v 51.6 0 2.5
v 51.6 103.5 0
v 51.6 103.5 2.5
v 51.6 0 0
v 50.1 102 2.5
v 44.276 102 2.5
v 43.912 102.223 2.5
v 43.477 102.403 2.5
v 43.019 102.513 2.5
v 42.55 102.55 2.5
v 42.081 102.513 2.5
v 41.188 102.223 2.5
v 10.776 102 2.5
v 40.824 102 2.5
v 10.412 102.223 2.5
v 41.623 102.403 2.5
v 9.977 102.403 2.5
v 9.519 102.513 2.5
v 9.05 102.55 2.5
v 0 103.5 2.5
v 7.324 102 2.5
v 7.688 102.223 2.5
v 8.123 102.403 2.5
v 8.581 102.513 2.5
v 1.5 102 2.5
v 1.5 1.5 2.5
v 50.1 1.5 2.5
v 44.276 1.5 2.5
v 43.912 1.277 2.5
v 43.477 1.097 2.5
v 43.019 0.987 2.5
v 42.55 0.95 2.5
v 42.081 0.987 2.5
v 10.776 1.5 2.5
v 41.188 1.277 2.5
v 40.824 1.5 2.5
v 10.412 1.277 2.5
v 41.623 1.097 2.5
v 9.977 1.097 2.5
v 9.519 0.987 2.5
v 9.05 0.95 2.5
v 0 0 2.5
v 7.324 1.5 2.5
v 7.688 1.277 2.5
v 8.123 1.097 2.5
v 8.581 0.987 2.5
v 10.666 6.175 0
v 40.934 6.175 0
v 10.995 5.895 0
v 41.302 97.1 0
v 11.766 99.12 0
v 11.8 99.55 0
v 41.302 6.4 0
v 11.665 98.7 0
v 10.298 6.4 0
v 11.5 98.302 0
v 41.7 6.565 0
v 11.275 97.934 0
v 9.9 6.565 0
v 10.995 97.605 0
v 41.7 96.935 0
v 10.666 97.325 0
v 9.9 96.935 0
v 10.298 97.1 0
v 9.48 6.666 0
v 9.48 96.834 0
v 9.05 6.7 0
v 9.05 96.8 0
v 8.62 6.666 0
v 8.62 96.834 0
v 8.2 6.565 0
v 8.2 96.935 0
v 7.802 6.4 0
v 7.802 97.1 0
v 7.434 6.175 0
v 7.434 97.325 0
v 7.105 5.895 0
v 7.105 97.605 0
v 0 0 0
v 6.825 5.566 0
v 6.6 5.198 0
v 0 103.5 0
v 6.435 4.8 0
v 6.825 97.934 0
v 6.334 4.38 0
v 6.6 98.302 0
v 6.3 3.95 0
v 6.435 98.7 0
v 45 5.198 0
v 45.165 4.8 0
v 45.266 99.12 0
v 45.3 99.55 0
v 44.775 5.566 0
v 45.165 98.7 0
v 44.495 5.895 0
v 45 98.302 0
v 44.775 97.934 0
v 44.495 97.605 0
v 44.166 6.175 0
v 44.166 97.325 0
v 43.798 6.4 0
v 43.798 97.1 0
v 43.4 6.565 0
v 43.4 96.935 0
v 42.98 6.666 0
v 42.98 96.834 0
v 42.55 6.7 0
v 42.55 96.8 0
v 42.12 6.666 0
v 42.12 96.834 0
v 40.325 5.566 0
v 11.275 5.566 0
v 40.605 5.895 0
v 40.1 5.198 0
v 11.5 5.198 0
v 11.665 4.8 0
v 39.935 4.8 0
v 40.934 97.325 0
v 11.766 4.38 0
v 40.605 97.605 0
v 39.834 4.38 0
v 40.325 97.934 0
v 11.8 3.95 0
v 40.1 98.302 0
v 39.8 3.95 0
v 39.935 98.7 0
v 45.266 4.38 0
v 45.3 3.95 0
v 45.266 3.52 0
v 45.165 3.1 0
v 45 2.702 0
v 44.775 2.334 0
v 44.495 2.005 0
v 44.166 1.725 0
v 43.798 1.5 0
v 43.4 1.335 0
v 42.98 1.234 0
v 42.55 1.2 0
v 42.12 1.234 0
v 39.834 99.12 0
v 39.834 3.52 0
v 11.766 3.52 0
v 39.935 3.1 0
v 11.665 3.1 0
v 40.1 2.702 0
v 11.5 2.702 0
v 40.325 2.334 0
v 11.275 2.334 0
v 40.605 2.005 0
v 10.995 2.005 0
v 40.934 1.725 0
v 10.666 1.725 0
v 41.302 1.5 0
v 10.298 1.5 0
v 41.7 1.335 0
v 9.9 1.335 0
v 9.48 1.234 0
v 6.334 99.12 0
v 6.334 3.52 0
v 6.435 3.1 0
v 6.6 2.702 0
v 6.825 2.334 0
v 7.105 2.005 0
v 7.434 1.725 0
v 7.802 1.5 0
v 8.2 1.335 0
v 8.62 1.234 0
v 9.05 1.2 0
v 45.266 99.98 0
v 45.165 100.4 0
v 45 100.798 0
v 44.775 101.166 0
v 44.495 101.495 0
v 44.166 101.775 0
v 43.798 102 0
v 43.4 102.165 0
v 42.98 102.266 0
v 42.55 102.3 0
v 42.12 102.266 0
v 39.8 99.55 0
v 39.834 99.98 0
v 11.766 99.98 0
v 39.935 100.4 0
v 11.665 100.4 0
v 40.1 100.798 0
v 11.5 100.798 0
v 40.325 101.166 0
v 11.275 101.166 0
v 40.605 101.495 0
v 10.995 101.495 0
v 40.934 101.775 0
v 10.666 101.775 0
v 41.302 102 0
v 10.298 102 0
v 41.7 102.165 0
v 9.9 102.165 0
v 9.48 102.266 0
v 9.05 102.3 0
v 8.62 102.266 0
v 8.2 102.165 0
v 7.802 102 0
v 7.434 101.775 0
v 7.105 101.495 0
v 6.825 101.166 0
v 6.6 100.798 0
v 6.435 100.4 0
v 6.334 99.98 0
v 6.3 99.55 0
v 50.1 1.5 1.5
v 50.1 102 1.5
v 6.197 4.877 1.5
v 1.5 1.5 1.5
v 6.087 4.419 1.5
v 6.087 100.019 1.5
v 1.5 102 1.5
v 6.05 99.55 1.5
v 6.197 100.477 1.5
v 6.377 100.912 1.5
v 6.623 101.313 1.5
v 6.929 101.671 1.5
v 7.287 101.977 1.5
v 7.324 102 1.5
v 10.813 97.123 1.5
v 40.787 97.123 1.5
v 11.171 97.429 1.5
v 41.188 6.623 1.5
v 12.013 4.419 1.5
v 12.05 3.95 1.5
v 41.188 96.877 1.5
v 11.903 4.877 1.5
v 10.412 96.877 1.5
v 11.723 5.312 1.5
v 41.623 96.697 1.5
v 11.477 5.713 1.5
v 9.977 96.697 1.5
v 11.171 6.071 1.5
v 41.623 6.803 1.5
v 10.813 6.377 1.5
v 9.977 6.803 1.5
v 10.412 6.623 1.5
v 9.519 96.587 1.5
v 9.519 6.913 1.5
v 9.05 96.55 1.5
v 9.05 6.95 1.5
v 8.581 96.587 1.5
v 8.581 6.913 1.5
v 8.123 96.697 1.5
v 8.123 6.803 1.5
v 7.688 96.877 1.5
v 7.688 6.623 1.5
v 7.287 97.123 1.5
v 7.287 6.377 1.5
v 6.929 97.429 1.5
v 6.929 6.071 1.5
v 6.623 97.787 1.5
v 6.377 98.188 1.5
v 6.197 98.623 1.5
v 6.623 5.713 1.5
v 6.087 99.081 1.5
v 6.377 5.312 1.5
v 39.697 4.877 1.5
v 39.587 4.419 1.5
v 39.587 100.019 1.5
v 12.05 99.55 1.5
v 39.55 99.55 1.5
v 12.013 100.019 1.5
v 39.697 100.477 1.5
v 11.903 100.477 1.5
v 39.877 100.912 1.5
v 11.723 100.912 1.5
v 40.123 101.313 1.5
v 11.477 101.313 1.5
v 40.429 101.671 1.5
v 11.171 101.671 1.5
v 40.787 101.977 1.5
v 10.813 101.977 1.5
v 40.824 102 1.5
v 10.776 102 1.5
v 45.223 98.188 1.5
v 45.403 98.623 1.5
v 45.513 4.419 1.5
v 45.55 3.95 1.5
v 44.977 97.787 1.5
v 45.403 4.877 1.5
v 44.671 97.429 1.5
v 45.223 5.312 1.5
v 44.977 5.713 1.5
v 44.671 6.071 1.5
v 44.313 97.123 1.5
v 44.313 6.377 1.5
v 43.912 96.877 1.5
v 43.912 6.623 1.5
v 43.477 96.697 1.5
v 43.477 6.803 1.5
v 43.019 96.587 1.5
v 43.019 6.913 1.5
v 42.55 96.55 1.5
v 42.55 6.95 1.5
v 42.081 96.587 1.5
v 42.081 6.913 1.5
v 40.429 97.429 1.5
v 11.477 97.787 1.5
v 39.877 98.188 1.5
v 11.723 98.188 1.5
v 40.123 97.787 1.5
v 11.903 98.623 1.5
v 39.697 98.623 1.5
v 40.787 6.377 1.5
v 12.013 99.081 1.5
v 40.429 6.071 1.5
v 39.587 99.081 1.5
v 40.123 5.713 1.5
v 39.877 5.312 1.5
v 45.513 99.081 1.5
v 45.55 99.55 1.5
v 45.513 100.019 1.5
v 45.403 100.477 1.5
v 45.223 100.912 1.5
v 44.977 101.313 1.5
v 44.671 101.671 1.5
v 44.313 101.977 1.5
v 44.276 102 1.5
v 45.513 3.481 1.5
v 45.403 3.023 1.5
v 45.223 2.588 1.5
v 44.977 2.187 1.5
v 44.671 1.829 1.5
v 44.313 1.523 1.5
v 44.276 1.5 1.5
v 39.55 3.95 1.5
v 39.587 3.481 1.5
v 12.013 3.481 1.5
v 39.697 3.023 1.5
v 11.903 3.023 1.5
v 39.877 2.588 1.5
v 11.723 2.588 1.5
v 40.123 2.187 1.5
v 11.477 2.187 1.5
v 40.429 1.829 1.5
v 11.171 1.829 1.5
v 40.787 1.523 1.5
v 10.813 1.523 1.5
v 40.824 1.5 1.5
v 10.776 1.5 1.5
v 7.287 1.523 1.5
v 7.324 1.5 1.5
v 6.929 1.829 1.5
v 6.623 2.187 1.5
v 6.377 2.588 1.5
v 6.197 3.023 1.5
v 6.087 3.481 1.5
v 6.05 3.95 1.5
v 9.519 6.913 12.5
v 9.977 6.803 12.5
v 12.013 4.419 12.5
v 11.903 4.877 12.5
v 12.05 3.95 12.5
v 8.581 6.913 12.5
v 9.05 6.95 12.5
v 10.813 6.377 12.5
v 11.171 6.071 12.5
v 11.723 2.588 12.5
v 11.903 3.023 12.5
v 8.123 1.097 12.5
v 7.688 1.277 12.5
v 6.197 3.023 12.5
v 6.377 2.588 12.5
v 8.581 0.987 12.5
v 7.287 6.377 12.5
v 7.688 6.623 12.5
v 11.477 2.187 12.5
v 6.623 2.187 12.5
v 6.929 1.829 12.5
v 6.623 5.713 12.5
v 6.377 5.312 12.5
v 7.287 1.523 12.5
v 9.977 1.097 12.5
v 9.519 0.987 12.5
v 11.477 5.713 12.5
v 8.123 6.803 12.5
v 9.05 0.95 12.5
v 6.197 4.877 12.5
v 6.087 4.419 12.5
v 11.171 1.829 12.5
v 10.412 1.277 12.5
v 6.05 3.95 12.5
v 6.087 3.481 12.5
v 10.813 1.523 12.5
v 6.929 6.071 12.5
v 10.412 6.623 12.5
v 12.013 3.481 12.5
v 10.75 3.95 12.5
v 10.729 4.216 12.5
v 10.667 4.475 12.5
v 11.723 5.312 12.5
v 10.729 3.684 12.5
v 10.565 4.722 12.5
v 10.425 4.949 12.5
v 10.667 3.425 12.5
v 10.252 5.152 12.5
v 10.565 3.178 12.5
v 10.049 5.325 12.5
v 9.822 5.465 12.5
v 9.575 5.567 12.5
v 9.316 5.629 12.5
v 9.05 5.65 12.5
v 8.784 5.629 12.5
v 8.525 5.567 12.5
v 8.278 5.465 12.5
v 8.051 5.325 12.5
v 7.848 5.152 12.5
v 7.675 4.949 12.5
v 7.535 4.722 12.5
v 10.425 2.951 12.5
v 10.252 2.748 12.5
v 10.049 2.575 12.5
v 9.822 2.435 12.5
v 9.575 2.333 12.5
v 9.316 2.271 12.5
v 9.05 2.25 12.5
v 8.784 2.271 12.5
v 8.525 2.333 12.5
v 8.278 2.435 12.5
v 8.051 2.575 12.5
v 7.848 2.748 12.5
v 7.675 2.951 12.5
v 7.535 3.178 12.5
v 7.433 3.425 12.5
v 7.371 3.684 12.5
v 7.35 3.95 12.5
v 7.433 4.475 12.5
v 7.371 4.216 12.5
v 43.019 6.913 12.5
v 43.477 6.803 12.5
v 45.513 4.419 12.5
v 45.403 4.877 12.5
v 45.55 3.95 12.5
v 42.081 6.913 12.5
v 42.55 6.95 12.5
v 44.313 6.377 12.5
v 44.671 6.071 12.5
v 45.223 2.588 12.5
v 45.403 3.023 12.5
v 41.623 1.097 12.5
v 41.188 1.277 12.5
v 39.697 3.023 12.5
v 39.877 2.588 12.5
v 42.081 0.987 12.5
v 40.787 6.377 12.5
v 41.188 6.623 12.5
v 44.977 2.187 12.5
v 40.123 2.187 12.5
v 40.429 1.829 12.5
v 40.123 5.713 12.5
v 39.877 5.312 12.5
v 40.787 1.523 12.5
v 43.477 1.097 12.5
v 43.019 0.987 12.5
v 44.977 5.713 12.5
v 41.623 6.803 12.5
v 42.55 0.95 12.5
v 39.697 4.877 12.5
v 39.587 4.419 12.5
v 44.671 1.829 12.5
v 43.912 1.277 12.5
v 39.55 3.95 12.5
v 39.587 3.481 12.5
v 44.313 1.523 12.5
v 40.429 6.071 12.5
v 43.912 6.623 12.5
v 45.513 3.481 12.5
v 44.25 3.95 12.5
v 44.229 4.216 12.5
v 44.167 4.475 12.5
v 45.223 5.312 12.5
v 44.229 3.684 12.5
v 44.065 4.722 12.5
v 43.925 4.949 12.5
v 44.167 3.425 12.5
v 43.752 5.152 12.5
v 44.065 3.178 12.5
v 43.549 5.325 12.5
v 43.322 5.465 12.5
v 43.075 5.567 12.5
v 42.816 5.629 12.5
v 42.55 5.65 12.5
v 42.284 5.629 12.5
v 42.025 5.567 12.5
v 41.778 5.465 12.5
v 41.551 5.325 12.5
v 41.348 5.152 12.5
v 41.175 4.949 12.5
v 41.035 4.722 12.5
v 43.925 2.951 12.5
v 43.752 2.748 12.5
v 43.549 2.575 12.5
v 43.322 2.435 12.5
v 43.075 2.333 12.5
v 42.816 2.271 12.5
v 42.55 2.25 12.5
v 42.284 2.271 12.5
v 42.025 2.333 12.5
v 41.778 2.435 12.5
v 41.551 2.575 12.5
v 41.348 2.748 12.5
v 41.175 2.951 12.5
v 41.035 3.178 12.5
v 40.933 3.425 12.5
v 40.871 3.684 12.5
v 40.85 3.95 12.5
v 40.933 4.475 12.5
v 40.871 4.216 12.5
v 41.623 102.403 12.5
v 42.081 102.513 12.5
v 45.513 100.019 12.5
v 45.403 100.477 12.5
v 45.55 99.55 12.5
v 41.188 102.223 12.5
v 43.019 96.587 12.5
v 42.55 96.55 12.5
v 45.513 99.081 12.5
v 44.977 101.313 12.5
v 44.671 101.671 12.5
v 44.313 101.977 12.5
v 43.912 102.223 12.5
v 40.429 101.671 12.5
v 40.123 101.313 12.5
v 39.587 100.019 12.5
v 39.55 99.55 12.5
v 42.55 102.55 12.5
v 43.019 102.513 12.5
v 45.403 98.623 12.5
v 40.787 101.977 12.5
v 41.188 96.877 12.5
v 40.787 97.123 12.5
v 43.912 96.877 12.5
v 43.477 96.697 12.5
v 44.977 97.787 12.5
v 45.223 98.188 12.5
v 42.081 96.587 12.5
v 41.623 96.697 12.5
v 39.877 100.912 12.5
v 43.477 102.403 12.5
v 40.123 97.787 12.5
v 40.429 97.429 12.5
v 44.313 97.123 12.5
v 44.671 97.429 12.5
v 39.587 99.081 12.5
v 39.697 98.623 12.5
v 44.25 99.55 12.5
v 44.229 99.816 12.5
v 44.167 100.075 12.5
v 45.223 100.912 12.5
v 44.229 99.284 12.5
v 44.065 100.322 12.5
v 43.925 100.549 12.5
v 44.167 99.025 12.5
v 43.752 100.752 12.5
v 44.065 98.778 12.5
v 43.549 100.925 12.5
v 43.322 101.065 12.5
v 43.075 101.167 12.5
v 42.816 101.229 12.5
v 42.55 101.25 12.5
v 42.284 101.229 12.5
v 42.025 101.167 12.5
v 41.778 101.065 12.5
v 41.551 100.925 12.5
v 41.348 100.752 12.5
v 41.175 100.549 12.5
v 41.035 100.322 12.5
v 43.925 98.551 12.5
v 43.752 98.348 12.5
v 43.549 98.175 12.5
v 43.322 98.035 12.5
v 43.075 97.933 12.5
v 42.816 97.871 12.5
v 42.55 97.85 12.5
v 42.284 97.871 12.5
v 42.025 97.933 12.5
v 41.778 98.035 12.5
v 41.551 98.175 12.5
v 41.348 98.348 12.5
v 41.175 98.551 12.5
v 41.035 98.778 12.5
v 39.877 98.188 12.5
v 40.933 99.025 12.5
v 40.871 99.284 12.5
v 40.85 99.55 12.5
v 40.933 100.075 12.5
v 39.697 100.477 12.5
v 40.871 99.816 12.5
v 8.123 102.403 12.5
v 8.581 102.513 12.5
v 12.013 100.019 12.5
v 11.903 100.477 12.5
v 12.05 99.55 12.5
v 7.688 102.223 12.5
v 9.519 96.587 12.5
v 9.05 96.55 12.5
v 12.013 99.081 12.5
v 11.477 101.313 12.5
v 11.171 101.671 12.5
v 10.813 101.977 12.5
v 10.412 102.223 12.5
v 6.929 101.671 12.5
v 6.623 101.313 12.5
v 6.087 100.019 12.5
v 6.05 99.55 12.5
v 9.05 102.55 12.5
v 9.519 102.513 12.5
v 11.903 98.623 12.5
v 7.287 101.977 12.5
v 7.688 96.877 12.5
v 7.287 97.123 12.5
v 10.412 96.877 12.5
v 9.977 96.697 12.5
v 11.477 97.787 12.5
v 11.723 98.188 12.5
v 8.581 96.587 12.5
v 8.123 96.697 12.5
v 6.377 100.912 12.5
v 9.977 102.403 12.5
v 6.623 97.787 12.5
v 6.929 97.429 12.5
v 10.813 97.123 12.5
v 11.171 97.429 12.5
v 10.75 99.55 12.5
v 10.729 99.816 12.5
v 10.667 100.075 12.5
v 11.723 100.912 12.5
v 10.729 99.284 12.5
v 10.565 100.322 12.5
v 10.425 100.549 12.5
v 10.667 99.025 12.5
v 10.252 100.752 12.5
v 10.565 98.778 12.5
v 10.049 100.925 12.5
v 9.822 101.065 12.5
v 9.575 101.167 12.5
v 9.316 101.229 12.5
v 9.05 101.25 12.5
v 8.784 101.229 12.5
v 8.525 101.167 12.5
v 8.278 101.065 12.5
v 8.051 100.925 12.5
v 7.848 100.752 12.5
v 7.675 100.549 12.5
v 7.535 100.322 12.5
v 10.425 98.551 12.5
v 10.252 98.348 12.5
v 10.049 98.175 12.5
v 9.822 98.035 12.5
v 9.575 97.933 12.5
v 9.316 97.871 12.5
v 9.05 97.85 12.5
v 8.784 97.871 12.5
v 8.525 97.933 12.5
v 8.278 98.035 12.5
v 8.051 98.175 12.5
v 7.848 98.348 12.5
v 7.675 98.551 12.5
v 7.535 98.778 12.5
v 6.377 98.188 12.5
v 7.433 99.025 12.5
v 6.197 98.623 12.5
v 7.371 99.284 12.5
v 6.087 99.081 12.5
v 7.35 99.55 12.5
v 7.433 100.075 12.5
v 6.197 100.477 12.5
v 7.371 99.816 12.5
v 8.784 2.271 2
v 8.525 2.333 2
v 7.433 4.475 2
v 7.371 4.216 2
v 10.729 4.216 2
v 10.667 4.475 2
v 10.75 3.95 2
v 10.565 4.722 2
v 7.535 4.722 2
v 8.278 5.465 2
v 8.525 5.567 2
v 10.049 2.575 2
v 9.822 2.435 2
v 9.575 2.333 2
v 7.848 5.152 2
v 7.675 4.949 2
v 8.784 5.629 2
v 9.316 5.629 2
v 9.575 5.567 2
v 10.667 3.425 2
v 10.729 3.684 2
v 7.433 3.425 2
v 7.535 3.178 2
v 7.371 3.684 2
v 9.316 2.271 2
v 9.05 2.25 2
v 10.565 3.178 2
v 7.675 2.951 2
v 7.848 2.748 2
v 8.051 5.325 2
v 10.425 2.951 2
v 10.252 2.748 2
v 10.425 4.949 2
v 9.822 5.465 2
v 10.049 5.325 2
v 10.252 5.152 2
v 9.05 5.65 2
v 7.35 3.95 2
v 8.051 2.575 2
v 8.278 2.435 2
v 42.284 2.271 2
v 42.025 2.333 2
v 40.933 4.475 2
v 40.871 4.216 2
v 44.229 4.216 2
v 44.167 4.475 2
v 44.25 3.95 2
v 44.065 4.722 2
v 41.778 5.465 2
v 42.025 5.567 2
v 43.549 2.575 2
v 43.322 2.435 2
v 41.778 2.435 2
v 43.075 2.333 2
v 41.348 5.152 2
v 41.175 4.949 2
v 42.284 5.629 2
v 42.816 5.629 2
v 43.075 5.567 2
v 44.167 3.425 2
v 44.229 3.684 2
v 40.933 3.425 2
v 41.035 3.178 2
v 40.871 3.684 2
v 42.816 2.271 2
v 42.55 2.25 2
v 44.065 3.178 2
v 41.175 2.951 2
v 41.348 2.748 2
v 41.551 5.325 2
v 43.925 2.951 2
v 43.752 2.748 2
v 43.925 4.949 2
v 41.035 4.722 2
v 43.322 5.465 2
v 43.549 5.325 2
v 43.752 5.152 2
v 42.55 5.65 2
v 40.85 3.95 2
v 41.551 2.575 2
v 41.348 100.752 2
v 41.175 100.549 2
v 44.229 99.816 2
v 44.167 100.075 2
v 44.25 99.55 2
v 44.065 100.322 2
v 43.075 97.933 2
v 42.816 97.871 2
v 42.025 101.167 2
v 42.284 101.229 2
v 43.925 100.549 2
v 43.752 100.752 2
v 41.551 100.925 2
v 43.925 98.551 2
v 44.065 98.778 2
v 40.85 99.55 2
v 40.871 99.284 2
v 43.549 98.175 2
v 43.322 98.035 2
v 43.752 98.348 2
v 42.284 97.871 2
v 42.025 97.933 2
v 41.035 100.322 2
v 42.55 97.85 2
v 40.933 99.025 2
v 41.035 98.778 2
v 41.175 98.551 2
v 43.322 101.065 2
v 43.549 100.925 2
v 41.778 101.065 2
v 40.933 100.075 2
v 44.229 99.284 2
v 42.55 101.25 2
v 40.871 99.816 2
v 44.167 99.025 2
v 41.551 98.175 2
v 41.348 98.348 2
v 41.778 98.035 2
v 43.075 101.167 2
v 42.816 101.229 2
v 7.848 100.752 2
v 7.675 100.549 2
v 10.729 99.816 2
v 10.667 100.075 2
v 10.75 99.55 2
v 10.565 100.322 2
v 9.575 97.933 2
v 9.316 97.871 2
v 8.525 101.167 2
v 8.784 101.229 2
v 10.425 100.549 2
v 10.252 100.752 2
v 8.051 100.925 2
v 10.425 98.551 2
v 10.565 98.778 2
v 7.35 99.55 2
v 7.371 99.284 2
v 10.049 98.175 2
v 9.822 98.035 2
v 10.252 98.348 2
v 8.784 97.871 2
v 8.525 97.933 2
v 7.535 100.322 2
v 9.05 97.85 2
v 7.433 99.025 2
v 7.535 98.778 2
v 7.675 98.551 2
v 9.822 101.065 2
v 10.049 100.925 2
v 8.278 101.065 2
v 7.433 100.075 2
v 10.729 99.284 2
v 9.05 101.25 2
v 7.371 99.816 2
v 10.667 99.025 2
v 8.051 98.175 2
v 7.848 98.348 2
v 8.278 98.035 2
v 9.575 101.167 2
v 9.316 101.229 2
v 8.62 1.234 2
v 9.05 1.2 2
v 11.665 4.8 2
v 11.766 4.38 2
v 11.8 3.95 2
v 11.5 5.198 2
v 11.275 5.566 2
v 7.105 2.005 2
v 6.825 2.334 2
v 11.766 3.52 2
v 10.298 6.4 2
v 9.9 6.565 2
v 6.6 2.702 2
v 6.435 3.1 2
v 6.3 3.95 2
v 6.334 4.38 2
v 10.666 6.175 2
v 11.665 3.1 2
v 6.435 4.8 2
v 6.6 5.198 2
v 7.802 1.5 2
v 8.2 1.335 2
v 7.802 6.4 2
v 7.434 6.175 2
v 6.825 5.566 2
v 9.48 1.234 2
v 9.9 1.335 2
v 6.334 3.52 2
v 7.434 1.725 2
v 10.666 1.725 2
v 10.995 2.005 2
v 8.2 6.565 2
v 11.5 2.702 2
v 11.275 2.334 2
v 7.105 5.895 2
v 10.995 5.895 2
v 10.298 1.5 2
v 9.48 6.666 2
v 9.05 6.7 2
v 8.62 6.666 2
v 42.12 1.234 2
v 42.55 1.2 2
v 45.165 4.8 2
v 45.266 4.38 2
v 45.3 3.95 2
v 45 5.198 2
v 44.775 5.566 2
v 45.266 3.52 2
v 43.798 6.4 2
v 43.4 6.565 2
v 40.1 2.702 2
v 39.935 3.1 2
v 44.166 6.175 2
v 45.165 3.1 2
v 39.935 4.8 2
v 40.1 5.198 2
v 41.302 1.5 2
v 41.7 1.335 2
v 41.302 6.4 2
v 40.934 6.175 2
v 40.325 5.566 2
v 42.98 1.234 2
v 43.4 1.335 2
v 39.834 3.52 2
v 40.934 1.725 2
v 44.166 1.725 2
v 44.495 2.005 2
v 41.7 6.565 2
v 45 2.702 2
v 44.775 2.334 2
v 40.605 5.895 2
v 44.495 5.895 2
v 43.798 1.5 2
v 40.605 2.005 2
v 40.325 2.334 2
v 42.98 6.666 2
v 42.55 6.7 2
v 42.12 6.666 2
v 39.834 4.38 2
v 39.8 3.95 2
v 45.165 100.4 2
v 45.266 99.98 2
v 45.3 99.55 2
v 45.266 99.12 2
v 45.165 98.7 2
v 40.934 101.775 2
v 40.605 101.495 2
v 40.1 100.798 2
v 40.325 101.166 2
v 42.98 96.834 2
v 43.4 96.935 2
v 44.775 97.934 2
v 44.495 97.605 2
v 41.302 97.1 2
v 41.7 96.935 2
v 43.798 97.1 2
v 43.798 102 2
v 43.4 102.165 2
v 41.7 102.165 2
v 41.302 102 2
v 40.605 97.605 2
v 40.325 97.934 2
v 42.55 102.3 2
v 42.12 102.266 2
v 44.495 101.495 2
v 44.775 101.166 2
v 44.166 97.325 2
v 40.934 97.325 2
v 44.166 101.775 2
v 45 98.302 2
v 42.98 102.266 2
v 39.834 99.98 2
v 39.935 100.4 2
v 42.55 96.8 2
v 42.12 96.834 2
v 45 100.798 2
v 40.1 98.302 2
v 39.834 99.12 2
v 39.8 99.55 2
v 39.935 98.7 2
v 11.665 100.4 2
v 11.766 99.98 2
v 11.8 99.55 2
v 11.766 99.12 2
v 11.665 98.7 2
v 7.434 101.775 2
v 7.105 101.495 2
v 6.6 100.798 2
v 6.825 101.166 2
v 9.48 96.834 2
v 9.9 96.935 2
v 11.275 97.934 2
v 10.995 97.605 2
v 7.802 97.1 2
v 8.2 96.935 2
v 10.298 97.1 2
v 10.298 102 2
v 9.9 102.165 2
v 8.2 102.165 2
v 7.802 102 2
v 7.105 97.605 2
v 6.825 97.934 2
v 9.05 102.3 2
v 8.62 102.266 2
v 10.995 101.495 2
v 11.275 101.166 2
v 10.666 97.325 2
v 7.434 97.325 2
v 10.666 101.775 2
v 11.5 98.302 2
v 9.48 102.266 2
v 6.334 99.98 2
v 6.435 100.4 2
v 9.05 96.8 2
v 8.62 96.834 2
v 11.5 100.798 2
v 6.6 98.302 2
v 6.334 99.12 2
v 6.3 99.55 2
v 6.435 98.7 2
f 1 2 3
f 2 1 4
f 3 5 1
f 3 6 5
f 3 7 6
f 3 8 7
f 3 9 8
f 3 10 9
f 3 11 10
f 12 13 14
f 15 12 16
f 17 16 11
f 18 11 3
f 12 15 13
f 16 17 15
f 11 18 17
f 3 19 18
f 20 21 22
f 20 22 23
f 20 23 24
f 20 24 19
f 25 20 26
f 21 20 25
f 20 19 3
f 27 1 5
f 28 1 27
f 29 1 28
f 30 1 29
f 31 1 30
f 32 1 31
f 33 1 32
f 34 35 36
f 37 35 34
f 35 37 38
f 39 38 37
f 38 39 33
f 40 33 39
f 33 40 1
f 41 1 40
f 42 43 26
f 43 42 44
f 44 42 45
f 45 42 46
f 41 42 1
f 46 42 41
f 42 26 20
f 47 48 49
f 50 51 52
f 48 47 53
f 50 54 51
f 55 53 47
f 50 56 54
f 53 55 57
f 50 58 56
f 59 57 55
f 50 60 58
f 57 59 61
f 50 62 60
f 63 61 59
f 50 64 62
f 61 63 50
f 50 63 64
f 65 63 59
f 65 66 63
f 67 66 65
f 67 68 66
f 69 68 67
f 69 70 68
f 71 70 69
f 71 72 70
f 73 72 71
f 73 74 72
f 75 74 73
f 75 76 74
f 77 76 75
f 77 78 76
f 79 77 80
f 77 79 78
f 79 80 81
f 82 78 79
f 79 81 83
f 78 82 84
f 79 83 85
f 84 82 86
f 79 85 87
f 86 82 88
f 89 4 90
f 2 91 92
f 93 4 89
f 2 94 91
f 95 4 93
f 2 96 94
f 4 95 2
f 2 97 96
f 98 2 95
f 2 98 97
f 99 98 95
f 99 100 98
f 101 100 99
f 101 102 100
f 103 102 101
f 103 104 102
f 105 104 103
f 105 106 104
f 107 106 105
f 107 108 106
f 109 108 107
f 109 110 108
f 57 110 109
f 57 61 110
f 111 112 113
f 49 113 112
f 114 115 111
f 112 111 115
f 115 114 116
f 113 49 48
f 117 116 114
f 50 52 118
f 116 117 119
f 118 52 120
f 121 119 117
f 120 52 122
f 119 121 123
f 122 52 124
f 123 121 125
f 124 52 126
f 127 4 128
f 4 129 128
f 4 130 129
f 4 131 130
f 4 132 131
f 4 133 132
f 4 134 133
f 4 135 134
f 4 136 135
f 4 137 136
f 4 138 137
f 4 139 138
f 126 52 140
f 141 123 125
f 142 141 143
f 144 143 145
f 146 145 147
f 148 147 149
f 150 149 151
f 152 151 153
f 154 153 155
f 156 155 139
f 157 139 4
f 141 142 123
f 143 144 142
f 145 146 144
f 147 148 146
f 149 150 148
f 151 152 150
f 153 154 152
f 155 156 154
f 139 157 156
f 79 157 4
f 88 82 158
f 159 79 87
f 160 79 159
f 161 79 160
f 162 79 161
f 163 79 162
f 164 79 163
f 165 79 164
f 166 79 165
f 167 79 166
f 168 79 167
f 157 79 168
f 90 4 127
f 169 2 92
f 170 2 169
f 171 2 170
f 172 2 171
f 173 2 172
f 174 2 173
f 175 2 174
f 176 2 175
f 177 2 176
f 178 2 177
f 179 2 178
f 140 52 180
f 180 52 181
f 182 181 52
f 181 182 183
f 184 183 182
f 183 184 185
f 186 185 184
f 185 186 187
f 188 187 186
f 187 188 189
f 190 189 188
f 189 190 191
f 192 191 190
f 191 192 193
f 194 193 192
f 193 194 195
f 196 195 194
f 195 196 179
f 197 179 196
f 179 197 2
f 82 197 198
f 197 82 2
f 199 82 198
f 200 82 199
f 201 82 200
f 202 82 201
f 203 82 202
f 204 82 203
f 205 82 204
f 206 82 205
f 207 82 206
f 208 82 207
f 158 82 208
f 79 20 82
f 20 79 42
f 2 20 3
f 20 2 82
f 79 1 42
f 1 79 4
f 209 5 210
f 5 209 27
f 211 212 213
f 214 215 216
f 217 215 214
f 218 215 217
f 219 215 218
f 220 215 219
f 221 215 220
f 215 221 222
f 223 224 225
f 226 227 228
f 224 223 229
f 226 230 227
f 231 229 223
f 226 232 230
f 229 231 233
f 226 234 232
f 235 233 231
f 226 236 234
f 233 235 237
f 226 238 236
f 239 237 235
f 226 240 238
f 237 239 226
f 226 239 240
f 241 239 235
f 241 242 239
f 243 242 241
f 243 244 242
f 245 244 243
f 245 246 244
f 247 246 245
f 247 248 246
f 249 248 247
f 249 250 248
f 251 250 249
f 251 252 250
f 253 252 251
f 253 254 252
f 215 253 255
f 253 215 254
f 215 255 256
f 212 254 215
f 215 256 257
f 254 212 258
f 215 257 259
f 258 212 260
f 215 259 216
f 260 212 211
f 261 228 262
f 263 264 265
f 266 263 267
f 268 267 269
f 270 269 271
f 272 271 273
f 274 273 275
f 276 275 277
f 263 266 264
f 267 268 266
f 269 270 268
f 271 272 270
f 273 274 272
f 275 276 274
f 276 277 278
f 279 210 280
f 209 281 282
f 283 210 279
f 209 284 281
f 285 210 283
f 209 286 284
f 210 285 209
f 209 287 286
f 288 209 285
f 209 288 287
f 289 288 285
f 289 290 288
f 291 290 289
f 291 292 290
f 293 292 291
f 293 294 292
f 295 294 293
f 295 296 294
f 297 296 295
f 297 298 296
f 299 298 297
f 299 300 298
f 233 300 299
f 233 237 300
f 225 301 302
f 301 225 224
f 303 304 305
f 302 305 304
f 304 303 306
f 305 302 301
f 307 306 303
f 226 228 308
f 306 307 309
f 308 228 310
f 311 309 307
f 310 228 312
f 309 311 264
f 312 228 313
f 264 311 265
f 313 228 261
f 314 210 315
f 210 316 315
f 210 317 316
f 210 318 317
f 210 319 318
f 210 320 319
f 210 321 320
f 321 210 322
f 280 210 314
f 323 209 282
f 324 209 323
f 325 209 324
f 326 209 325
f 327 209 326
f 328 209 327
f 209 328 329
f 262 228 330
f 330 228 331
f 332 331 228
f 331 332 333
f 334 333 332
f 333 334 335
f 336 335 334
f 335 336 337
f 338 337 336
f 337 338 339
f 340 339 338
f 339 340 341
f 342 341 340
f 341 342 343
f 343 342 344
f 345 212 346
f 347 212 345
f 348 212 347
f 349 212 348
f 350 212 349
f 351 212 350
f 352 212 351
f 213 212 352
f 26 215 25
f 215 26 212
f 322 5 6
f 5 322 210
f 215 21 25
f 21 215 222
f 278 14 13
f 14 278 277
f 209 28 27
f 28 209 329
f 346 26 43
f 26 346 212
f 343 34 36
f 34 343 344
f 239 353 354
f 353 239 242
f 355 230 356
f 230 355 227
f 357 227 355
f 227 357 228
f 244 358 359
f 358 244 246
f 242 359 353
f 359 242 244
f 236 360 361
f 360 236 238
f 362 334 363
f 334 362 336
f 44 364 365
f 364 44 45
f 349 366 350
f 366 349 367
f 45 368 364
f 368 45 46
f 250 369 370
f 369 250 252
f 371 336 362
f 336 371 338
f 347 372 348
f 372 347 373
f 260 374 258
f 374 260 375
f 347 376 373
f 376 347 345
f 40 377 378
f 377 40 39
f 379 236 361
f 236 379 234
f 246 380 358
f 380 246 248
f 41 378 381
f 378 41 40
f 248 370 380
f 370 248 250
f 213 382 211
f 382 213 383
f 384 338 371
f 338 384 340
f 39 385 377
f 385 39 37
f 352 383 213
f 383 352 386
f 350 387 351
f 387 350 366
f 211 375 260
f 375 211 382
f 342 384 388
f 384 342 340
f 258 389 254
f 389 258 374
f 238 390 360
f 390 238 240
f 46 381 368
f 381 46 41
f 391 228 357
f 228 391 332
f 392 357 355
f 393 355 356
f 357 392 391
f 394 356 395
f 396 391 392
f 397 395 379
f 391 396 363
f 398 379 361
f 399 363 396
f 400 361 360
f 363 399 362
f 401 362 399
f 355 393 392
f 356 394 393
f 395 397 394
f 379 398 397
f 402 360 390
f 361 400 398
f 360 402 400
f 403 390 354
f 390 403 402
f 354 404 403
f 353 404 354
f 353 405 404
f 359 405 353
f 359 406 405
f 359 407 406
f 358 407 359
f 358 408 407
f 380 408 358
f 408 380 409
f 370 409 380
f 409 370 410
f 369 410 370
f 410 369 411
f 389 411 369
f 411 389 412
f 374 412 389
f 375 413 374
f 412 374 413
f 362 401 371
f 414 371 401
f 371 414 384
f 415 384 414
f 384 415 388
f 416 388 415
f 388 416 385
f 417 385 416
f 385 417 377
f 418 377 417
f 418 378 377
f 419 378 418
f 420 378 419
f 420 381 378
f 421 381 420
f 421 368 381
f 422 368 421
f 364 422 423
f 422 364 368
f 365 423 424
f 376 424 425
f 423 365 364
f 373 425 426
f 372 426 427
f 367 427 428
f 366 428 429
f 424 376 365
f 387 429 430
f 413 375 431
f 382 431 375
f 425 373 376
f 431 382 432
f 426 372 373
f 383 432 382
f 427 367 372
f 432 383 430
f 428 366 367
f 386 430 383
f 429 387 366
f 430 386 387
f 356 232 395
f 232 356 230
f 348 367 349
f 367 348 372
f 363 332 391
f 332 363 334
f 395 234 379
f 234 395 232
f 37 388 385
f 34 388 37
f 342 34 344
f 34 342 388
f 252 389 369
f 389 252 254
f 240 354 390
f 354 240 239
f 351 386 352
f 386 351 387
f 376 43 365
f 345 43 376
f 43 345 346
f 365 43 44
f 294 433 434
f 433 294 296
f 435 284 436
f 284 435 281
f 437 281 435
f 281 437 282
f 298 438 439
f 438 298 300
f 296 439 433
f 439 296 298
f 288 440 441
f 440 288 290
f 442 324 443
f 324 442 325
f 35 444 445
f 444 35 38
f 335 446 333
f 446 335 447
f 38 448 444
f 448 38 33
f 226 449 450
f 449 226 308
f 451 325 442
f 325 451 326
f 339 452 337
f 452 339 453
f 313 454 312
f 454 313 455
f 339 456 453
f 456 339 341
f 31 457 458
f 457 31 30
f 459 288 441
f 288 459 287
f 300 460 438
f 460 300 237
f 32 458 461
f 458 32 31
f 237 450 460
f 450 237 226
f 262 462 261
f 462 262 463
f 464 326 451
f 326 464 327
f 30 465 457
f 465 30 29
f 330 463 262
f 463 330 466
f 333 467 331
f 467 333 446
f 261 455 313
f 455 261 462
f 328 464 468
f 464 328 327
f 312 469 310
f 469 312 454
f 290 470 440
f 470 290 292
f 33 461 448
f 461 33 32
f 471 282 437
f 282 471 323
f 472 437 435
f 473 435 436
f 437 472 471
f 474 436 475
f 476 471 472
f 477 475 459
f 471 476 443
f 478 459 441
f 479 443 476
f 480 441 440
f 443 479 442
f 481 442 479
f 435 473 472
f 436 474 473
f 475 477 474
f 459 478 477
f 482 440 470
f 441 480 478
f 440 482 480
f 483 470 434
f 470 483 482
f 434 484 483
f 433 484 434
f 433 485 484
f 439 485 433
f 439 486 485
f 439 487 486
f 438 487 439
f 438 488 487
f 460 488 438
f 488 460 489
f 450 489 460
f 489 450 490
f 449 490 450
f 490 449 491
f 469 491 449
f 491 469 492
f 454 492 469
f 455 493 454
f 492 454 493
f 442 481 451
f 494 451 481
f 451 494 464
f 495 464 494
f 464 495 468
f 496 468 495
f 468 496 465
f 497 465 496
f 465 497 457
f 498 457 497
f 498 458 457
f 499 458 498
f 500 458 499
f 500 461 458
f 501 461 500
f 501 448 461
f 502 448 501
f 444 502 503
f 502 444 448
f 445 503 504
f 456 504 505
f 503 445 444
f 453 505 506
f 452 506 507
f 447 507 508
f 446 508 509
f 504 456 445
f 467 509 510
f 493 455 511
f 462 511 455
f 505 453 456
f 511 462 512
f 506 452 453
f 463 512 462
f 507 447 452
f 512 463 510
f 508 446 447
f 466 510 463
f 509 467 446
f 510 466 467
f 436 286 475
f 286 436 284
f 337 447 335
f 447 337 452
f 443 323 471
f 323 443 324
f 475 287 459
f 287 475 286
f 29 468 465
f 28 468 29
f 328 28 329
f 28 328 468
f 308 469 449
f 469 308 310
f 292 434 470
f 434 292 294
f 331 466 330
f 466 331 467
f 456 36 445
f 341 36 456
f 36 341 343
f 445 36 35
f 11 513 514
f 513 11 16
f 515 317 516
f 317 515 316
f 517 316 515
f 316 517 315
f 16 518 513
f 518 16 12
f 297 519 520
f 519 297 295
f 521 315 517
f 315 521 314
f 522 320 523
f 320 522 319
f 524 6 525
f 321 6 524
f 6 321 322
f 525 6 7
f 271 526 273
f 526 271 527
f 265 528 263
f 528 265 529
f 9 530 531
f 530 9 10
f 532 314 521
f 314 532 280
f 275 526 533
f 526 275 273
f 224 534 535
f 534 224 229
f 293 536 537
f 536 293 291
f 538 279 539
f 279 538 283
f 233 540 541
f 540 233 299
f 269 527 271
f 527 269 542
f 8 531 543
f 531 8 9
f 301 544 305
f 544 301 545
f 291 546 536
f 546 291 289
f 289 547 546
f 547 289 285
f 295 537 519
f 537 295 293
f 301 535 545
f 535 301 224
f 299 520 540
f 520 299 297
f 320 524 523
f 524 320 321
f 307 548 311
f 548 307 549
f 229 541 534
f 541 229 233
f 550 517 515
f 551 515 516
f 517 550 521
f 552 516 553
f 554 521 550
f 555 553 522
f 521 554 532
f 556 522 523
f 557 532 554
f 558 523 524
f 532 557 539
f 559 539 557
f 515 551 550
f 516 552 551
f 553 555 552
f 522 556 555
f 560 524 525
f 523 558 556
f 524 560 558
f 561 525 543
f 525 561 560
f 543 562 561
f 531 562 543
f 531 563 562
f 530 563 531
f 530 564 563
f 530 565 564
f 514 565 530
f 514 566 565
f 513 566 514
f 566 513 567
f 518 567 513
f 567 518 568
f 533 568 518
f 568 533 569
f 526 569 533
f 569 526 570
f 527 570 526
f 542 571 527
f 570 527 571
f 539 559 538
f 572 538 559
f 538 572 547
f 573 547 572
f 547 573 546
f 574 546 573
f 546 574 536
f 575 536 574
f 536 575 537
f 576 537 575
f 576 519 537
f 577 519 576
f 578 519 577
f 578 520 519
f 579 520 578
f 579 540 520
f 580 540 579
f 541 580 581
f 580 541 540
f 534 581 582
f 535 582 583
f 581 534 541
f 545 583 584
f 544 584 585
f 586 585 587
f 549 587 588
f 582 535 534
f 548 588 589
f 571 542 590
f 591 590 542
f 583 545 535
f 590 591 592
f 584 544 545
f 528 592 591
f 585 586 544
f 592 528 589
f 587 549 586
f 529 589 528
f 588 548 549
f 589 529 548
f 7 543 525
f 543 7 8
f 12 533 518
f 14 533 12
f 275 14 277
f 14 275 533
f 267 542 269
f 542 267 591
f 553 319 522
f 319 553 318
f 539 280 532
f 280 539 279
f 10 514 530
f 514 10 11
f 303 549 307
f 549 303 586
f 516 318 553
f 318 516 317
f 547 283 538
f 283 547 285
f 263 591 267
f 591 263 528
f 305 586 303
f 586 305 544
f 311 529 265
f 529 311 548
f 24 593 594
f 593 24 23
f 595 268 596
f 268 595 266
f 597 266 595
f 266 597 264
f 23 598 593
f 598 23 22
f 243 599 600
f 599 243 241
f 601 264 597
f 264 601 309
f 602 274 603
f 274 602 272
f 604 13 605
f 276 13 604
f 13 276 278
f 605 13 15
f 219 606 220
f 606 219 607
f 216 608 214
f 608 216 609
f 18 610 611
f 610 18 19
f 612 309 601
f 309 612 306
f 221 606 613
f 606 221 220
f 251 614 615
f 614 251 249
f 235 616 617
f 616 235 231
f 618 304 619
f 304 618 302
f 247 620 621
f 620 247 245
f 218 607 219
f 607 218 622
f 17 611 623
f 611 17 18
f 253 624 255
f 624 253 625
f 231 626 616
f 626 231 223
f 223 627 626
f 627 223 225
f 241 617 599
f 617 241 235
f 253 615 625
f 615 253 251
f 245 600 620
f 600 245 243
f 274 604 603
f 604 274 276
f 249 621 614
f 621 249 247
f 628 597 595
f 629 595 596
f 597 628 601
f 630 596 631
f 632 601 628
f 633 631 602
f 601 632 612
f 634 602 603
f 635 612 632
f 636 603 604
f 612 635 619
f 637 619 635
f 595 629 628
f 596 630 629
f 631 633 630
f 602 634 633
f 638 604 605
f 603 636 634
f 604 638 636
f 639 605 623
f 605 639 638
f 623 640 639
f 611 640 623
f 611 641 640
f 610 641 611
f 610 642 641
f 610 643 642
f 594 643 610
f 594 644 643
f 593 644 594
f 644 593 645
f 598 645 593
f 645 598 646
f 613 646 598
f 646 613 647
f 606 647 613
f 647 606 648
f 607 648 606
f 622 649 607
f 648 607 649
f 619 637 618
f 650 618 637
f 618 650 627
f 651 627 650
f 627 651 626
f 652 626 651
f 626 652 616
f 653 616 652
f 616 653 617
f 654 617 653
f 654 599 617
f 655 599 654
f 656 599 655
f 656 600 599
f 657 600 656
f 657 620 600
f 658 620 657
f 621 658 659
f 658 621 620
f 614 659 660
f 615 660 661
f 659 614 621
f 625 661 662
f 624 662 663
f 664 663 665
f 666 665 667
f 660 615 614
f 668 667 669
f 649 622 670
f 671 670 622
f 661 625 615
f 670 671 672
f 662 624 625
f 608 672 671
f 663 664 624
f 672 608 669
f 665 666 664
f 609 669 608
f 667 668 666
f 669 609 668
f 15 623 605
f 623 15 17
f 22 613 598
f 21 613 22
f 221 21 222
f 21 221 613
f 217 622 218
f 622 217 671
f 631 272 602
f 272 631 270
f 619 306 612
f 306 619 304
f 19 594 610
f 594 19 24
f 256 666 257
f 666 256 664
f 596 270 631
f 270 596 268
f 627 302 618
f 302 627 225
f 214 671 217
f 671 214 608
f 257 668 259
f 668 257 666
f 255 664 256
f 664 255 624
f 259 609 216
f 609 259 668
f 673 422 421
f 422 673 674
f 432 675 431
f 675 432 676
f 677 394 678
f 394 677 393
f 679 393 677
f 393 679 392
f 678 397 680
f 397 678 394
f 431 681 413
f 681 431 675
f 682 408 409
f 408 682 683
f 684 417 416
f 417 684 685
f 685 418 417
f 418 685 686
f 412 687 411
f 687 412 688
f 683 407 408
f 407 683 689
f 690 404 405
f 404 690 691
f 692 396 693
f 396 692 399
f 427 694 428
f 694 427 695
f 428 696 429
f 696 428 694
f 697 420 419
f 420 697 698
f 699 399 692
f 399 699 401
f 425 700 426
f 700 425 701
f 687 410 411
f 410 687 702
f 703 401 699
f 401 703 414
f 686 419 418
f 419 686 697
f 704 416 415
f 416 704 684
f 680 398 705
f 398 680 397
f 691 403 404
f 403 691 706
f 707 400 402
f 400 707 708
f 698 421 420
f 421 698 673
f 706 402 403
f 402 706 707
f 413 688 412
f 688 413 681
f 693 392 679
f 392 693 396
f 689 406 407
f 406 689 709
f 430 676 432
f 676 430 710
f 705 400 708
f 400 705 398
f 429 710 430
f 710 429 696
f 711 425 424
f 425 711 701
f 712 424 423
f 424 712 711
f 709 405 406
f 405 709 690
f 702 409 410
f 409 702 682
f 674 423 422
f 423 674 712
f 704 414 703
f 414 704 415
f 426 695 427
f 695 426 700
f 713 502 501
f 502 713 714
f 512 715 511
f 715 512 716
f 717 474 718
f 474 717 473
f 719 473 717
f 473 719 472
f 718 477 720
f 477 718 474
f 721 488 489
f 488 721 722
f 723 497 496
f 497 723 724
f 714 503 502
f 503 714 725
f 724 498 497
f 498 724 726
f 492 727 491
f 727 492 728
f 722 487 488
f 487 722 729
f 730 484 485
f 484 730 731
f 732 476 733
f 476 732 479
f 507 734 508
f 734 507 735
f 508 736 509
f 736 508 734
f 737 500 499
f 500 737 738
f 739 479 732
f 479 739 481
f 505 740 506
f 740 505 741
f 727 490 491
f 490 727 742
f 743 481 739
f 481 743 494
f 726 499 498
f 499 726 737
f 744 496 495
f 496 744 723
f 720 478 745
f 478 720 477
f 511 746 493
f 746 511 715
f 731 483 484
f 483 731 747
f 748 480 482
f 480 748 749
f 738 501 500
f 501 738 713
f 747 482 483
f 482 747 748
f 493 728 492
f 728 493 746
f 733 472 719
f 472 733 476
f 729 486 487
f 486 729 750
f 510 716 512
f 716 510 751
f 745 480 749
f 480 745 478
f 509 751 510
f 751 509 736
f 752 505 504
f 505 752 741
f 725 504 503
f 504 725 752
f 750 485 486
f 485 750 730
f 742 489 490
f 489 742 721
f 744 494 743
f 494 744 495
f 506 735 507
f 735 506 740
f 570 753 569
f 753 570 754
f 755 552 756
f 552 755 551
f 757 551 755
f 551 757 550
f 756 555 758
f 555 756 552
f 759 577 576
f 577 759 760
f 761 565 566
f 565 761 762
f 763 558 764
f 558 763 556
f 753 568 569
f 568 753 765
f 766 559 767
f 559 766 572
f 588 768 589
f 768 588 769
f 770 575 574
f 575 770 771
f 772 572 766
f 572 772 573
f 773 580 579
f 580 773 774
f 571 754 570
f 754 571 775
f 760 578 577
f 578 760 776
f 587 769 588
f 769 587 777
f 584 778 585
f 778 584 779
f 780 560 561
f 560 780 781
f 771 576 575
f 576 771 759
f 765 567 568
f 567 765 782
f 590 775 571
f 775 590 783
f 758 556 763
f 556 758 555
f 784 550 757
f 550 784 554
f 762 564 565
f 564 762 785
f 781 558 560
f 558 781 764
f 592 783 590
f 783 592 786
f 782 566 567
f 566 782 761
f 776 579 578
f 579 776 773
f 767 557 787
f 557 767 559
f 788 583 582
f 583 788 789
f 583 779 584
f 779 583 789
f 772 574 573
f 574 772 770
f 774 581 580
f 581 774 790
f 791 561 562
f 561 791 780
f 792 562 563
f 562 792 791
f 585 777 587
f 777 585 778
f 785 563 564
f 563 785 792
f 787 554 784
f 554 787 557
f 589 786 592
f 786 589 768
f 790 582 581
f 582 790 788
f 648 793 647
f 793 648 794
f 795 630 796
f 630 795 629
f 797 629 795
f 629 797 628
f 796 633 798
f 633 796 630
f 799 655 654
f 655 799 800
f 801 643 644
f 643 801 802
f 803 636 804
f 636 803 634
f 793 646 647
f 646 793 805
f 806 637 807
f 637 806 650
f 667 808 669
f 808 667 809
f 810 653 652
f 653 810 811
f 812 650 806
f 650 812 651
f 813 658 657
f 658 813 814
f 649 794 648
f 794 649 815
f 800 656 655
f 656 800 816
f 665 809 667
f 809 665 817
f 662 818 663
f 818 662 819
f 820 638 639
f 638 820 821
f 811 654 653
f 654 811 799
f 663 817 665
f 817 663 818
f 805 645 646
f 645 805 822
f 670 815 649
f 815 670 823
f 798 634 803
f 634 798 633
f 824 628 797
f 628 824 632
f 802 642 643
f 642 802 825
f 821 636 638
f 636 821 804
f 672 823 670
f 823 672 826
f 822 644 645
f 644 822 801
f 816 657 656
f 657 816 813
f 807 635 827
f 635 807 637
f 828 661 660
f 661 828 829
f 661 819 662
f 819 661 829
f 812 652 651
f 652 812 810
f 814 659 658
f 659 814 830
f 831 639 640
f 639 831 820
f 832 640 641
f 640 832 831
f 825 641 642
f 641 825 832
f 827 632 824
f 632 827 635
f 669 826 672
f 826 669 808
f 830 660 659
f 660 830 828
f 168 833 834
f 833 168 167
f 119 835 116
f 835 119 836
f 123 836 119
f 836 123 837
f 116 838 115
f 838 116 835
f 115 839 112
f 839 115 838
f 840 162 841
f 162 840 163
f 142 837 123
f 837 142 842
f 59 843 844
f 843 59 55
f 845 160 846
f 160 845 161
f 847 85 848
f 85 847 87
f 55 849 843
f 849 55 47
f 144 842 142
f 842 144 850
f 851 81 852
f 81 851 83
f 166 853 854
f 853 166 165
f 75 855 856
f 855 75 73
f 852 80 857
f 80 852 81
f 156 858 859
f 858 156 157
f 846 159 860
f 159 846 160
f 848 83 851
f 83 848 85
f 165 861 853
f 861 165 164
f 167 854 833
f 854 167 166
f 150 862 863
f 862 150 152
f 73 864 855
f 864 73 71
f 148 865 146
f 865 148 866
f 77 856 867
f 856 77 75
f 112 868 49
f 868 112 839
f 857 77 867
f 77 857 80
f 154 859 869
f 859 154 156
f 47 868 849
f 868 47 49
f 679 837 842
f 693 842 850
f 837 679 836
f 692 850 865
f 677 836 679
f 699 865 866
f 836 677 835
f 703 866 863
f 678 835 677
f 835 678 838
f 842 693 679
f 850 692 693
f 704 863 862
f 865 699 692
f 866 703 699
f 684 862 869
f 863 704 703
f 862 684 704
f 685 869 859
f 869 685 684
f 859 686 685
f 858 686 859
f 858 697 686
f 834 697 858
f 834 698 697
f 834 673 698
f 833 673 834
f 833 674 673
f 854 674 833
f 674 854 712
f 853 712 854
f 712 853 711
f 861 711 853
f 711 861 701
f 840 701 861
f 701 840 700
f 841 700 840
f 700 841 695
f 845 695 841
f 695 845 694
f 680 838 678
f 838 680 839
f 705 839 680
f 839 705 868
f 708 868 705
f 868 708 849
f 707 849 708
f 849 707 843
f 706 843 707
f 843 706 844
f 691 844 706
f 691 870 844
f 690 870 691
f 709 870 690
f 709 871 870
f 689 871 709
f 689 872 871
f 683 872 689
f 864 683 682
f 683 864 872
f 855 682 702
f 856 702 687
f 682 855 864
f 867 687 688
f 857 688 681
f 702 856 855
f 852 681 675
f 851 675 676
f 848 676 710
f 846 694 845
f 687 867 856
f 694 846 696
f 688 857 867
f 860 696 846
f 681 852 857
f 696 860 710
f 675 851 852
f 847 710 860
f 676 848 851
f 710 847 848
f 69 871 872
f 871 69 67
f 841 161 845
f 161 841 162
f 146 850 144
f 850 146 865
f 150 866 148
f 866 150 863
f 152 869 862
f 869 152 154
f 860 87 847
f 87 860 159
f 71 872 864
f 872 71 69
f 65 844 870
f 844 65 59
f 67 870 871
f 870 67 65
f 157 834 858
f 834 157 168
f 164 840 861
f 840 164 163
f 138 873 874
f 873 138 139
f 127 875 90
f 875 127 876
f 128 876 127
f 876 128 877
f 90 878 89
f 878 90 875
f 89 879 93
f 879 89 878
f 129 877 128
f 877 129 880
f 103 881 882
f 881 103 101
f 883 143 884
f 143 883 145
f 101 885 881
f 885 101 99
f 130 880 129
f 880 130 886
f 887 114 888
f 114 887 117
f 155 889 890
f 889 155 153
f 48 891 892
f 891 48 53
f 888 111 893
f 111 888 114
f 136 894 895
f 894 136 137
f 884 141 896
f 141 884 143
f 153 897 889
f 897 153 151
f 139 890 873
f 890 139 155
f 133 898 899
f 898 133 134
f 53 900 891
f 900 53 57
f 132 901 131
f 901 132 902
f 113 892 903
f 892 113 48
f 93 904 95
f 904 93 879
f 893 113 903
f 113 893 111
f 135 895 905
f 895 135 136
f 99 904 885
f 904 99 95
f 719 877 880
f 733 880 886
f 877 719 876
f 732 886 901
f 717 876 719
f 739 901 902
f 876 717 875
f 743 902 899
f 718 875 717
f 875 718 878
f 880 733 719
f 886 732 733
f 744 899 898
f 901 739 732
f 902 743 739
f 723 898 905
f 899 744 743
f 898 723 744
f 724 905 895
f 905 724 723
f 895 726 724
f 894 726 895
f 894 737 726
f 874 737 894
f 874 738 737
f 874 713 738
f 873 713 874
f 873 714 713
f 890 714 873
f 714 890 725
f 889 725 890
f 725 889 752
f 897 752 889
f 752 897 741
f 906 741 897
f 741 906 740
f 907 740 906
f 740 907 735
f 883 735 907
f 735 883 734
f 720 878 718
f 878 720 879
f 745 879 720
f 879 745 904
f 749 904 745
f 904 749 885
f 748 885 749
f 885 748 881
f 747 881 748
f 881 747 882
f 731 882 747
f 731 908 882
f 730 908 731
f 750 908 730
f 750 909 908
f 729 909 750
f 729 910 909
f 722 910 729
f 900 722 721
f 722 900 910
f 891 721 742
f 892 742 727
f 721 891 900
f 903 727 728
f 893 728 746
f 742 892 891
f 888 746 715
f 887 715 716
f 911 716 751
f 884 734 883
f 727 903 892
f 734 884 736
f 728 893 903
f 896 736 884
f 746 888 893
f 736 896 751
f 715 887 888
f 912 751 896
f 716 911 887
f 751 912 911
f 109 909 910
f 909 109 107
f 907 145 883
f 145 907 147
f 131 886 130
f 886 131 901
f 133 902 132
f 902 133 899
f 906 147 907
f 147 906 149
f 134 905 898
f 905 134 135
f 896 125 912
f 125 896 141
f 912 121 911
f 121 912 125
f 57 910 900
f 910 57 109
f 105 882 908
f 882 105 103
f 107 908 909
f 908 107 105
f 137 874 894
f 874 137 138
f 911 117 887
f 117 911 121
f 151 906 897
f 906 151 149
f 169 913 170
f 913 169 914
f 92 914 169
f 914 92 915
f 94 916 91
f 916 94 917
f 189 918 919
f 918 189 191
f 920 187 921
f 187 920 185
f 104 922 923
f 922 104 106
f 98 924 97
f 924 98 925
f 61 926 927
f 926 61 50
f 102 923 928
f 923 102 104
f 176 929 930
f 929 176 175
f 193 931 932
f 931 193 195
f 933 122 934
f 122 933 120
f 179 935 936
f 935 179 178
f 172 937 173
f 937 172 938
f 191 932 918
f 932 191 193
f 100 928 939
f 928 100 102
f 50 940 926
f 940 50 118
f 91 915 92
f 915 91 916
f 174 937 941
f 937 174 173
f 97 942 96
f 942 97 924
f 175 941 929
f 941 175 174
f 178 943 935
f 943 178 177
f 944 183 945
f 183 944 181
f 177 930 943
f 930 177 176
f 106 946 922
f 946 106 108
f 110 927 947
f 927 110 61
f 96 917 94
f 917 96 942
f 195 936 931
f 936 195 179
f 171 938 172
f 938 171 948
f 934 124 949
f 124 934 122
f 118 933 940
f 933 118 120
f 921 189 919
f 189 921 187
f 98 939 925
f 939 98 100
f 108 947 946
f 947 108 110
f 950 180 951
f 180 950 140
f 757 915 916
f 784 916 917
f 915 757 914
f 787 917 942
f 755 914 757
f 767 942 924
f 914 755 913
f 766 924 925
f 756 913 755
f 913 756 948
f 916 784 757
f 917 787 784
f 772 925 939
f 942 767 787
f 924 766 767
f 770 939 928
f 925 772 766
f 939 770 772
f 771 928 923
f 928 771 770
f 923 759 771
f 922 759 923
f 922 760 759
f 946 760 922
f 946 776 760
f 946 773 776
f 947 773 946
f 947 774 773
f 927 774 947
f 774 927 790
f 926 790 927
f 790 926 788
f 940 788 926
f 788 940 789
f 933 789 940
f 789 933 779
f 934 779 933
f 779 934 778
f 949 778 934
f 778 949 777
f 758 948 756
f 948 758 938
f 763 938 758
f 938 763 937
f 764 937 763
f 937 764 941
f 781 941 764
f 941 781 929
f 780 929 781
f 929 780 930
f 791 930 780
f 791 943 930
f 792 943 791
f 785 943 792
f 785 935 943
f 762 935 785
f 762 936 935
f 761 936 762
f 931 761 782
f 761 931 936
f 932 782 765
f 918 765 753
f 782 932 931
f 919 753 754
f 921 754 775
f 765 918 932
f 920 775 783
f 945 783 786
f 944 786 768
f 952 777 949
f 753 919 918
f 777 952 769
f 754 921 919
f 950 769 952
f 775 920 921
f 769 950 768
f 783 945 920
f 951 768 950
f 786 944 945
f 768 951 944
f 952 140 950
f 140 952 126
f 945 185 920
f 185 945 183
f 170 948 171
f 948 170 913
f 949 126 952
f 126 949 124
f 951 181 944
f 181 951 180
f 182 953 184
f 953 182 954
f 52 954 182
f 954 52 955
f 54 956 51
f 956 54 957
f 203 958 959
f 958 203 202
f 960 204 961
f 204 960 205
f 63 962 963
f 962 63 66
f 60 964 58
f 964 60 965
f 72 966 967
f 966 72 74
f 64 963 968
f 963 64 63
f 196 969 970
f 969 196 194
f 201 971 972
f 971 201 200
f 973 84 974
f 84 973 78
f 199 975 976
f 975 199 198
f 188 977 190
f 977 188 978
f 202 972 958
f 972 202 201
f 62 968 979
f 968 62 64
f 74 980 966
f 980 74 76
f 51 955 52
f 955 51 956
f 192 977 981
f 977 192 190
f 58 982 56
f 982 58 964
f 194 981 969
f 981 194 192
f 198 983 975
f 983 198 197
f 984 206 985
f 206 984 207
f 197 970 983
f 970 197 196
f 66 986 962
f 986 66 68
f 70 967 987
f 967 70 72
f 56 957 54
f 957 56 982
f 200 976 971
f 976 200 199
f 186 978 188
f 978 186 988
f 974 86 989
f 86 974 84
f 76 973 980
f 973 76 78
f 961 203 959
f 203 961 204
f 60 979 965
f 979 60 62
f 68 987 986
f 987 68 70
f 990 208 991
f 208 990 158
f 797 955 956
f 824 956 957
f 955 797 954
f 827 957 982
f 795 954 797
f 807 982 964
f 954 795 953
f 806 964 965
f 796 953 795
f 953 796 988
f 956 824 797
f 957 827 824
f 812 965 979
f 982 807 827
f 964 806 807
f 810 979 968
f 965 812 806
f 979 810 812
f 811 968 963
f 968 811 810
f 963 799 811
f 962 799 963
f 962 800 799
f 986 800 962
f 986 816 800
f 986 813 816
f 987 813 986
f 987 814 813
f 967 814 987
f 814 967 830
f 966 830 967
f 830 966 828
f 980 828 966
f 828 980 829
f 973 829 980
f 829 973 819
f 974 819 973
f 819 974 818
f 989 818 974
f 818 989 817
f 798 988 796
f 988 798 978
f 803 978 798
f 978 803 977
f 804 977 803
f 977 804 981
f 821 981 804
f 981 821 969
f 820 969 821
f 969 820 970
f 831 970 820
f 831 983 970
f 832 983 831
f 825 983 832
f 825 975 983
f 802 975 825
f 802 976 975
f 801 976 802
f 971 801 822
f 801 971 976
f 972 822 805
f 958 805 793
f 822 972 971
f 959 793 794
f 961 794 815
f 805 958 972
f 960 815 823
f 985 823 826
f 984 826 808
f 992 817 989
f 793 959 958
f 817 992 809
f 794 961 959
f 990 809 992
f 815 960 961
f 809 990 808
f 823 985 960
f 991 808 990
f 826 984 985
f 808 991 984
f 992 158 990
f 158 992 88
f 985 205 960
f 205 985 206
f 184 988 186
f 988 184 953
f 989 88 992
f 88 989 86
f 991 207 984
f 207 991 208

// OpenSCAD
// Copyright (C) 2026 Jonas Immanuel Frey - Licensed under MIT. See LICENSE file for details

// ============================================
// PCB Baseplate Generator
// Protects bottom-side SMD components
// ============================================

/* [Board Dimensions] */

// Board width in mm
n_scl_x__board       = 48.2;
// Board height in mm
n_scl_y__board       = 100.1;
// Board thickness in mm
n_scl_z__board       = 1.6;

/* [Mounting Holes] */

// Hole-to-hole distance in X direction (outside-to-outside, as measured with caliper) in mm
n_scl_x__hole        = 30.1;
// Hole-to-hole distance in Y direction (outside-to-outside, as measured with caliper) in mm
n_scl_y__hole        = 92.2;
// Hole diameter in mm
n_dia__hole          = 3.4; // [2.2:M2, 3.2:M3, 4.3:M4, 5.3:M5]
// Standoff outer diameter in mm
n_dia__standoff      = 6.0;
// Screw head diameter in mm (for counterbore)
n_dia__head          = 5.5; // [4.0:M2, 5.5:M3, 7.0:M4, 8.5:M5]
// Screw head height in mm (counterbore depth)
n_scl_z__head        = 2.0; // [1.6:M2, 2.0:M3, 2.8:M4, 3.5:M5]

/* [Baseplate] */

// Cavity depth - space for SMD components in mm
n_scl_z__clearance   = 1.0;
// Floor thickness in mm
n_scl_z__floor       = 1.5;
// Wall thickness around PCB edge in mm
n_off__wall          = 1.5;
// Gap between PCB edge and inner wall (print tolerance) in mm
n_gap__pcb           = 0.2;
// Extra standoff height above rim in mm (0 = flush)
n_scl_z__standoff    = 10;

// Derived values
n_scl_x__outer = n_scl_x__board + 2 * (n_gap__pcb + n_off__wall);
n_scl_y__outer = n_scl_y__board + 2 * (n_gap__pcb + n_off__wall);
n_scl_z__rim   = n_scl_z__floor + n_scl_z__clearance;
n_scl_z__total = n_scl_z__rim + n_scl_z__standoff;

n_r__hole     = n_dia__hole / 2;
n_r__standoff = n_dia__standoff / 2;
n_r__head     = n_dia__head / 2;

// Hole positions relative to PCB origin (centered on board)
n_cx = n_scl_x__board / 2;
n_cy = n_scl_y__board / 2;
// Compensate: caliper measures outside-to-outside, add hole diameter for center-to-center
n_off_x__hole = (n_scl_x__hole + n_dia__hole) / 2;
n_off_y__hole = (n_scl_y__hole + n_dia__hole) / 2;

a_a_n_pos__hole = [
    [n_cx - n_off_x__hole, n_cy - n_off_y__hole],
    [n_cx + n_off_x__hole, n_cy - n_off_y__hole],
    [n_cx + n_off_x__hole, n_cy + n_off_y__hole],
    [n_cx - n_off_x__hole, n_cy + n_off_y__hole]
];

// PCB origin offset (PCB sits centered inside the outer shell)
n_off_x__pcb = n_gap__pcb + n_off__wall;
n_off_y__pcb = n_gap__pcb + n_off__wall;

$fn = 40;

module m_baseplate() {
    difference() {
        union() {
            // Outer shell: floor + rim walls
            difference() {
                // Solid outer block
                cube([n_scl_x__outer, n_scl_y__outer, n_scl_z__rim]);

                // Hollow out the cavity (leave floor and walls)
                translate([n_off__wall, n_off__wall, n_scl_z__floor])
                    cube([
                        n_scl_x__outer - 2 * n_off__wall,
                        n_scl_y__outer - 2 * n_off__wall,
                        n_scl_z__clearance + 1  // +1 to cut through top
                    ]);
            }

            // Standoffs at each hole position
            for (n_pos = a_a_n_pos__hole) {
                translate([
                    n_off_x__pcb + n_pos[0],
                    n_off_y__pcb + n_pos[1],
                    0
                ])
                    cylinder(h = n_scl_z__total, r = n_r__standoff);
            }
        }

        // Drill through-holes at each mounting position
        for (n_pos = a_a_n_pos__hole) {
            translate([
                n_off_x__pcb + n_pos[0],
                n_off_y__pcb + n_pos[1],
                -1
            ])
                cylinder(h = n_scl_z__total + 2, r = n_r__hole);
        }

        // Counterbore from bottom for screw heads
        for (n_pos = a_a_n_pos__hole) {
            translate([
                n_off_x__pcb + n_pos[0],
                n_off_y__pcb + n_pos[1],
                -0.01
            ])
                cylinder(h = n_scl_z__head + 0.01, r = n_r__head);
        }
    }
}

m_baseplate();

// --- Info echo ---
echo(str("Board: ", n_scl_x__board, " x ", n_scl_y__board, " x ", n_scl_z__board, " | Holes: ", n_scl_x__hole, " x ", n_scl_y__hole));
echo(str("Baseplate outer: ", n_scl_x__outer, " x ", n_scl_y__outer, " x ", n_scl_z__rim, " mm"));
echo(str("Cavity depth: ", n_scl_z__clearance, " mm"));
echo(str("Total height with standoffs: ", n_scl_z__total, " mm"));
